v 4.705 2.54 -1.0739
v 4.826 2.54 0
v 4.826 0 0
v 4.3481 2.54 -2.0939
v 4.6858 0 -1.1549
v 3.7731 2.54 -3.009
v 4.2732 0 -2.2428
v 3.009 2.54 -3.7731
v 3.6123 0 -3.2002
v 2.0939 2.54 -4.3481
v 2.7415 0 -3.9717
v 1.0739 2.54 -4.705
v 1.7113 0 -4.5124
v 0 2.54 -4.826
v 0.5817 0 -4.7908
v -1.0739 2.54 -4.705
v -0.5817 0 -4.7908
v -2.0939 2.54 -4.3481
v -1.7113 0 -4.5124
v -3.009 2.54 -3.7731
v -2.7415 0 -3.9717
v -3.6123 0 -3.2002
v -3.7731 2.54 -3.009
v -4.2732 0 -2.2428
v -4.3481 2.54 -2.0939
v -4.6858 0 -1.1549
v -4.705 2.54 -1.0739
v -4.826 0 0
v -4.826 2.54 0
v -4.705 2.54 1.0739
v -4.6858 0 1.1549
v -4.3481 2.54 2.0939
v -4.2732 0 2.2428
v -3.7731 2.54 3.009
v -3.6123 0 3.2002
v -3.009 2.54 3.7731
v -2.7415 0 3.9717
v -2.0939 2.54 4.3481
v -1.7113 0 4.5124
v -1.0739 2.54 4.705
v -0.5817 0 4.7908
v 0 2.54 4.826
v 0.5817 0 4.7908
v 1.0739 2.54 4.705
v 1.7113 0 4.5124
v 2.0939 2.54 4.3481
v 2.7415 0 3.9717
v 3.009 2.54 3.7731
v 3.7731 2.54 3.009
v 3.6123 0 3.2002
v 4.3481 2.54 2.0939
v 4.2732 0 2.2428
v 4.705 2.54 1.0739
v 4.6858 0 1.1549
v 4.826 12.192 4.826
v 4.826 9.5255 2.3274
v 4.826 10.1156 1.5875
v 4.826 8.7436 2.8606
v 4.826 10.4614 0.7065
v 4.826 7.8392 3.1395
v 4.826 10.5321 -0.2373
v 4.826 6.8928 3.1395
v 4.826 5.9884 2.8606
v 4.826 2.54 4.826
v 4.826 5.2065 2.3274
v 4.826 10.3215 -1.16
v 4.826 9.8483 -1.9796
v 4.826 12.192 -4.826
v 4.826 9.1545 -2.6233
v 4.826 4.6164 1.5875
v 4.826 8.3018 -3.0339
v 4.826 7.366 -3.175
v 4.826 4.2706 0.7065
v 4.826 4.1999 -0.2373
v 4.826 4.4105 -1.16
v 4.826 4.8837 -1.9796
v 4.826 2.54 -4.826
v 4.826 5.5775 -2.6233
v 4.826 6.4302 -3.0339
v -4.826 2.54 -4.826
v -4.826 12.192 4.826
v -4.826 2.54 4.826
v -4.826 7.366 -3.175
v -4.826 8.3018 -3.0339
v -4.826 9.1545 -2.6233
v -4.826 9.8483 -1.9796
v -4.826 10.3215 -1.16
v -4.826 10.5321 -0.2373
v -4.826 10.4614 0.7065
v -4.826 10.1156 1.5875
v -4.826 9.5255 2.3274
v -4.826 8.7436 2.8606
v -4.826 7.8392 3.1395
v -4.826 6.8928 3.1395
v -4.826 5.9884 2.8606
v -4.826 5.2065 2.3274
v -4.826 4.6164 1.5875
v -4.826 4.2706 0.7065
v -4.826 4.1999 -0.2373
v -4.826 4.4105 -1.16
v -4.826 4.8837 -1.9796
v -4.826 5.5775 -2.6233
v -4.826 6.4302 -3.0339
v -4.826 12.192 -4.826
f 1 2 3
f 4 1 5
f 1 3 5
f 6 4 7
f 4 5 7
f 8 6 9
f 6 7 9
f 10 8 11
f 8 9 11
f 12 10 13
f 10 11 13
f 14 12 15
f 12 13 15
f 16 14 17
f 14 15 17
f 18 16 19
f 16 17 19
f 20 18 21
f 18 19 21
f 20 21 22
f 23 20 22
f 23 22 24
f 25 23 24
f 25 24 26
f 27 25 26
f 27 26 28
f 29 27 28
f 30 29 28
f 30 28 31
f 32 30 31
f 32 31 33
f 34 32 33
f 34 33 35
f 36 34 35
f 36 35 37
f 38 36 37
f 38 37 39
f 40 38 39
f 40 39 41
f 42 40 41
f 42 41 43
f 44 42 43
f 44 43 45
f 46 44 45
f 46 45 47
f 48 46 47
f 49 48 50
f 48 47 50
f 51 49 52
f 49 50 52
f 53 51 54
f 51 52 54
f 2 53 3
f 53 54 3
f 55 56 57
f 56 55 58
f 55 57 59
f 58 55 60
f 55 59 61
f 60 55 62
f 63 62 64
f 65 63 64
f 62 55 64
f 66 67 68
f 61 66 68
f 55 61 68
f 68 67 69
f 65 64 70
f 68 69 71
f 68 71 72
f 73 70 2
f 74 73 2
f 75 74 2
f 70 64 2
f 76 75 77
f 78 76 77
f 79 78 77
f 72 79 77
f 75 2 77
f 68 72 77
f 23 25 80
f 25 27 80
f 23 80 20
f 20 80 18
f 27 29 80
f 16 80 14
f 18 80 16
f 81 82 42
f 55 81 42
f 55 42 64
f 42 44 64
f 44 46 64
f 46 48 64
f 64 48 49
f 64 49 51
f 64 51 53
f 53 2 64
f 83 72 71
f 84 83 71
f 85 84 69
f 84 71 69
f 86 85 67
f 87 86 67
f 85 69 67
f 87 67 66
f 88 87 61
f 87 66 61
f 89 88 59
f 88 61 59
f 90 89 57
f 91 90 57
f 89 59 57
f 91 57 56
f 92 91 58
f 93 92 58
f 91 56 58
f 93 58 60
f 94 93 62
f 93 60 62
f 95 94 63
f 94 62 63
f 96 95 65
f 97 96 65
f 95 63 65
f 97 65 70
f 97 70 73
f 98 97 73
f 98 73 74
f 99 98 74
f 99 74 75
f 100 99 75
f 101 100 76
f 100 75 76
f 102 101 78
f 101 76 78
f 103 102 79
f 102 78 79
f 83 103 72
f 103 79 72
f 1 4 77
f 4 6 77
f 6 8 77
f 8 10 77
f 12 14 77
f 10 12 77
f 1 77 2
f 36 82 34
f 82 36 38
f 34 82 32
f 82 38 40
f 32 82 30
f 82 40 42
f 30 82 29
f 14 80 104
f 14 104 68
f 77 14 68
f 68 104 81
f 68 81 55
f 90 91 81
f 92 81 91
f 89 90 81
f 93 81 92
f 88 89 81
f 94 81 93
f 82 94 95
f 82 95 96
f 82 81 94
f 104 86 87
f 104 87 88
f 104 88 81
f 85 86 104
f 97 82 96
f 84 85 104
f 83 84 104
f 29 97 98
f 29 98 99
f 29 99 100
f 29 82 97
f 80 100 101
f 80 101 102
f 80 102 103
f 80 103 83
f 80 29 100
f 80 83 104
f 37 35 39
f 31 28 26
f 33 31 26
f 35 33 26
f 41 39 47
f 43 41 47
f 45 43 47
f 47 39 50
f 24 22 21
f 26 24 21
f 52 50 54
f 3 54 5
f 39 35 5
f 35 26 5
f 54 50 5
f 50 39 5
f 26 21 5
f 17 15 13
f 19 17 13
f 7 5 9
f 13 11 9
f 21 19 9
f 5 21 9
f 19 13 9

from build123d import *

# Parameters (mm, degrees)
SKETCH1_R           = 4.826
BOSS_EXTRUDE1_DEPTH = 2.54
SKETCH2_W           = 9.652
SKETCH2_H           = 9.652
BOSS_EXTRUDE2_DEPTH = 9.652
SKETCH3_R           = 3.175
CUT_EXTRUDE1_DEPTH  = 9.652


with BuildPart() as part:
    # Sketch1 → Boss-Extrude1 (new body)
    with BuildSketch(Plane(origin=(0, 0, 0), x_dir=(1, 0, 0), z_dir=(0, 1, 0))):
        Circle(SKETCH1_R)
    extrude(amount=BOSS_EXTRUDE1_DEPTH)

    # Sketch2 → Boss-Extrude2 (add)
    with BuildSketch(Plane(origin=(0, 2.54, 0), x_dir=(1, 0, 0), z_dir=(0, 1, 0))):
        Rectangle(SKETCH2_W, SKETCH2_H)
    extrude(amount=BOSS_EXTRUDE2_DEPTH)

    # Sketch3 → Cut-Extrude1 (cut)
    with BuildSketch(Plane(origin=(4.826, 0, 0), x_dir=(0, 0, -1), z_dir=(1, 0, 0))):
        with Locations((0, 7.366)):
            Circle(SKETCH3_R)
    extrude(amount=-CUT_EXTRUDE1_DEPTH, mode=Mode.SUBTRACT)


solid = part.part
